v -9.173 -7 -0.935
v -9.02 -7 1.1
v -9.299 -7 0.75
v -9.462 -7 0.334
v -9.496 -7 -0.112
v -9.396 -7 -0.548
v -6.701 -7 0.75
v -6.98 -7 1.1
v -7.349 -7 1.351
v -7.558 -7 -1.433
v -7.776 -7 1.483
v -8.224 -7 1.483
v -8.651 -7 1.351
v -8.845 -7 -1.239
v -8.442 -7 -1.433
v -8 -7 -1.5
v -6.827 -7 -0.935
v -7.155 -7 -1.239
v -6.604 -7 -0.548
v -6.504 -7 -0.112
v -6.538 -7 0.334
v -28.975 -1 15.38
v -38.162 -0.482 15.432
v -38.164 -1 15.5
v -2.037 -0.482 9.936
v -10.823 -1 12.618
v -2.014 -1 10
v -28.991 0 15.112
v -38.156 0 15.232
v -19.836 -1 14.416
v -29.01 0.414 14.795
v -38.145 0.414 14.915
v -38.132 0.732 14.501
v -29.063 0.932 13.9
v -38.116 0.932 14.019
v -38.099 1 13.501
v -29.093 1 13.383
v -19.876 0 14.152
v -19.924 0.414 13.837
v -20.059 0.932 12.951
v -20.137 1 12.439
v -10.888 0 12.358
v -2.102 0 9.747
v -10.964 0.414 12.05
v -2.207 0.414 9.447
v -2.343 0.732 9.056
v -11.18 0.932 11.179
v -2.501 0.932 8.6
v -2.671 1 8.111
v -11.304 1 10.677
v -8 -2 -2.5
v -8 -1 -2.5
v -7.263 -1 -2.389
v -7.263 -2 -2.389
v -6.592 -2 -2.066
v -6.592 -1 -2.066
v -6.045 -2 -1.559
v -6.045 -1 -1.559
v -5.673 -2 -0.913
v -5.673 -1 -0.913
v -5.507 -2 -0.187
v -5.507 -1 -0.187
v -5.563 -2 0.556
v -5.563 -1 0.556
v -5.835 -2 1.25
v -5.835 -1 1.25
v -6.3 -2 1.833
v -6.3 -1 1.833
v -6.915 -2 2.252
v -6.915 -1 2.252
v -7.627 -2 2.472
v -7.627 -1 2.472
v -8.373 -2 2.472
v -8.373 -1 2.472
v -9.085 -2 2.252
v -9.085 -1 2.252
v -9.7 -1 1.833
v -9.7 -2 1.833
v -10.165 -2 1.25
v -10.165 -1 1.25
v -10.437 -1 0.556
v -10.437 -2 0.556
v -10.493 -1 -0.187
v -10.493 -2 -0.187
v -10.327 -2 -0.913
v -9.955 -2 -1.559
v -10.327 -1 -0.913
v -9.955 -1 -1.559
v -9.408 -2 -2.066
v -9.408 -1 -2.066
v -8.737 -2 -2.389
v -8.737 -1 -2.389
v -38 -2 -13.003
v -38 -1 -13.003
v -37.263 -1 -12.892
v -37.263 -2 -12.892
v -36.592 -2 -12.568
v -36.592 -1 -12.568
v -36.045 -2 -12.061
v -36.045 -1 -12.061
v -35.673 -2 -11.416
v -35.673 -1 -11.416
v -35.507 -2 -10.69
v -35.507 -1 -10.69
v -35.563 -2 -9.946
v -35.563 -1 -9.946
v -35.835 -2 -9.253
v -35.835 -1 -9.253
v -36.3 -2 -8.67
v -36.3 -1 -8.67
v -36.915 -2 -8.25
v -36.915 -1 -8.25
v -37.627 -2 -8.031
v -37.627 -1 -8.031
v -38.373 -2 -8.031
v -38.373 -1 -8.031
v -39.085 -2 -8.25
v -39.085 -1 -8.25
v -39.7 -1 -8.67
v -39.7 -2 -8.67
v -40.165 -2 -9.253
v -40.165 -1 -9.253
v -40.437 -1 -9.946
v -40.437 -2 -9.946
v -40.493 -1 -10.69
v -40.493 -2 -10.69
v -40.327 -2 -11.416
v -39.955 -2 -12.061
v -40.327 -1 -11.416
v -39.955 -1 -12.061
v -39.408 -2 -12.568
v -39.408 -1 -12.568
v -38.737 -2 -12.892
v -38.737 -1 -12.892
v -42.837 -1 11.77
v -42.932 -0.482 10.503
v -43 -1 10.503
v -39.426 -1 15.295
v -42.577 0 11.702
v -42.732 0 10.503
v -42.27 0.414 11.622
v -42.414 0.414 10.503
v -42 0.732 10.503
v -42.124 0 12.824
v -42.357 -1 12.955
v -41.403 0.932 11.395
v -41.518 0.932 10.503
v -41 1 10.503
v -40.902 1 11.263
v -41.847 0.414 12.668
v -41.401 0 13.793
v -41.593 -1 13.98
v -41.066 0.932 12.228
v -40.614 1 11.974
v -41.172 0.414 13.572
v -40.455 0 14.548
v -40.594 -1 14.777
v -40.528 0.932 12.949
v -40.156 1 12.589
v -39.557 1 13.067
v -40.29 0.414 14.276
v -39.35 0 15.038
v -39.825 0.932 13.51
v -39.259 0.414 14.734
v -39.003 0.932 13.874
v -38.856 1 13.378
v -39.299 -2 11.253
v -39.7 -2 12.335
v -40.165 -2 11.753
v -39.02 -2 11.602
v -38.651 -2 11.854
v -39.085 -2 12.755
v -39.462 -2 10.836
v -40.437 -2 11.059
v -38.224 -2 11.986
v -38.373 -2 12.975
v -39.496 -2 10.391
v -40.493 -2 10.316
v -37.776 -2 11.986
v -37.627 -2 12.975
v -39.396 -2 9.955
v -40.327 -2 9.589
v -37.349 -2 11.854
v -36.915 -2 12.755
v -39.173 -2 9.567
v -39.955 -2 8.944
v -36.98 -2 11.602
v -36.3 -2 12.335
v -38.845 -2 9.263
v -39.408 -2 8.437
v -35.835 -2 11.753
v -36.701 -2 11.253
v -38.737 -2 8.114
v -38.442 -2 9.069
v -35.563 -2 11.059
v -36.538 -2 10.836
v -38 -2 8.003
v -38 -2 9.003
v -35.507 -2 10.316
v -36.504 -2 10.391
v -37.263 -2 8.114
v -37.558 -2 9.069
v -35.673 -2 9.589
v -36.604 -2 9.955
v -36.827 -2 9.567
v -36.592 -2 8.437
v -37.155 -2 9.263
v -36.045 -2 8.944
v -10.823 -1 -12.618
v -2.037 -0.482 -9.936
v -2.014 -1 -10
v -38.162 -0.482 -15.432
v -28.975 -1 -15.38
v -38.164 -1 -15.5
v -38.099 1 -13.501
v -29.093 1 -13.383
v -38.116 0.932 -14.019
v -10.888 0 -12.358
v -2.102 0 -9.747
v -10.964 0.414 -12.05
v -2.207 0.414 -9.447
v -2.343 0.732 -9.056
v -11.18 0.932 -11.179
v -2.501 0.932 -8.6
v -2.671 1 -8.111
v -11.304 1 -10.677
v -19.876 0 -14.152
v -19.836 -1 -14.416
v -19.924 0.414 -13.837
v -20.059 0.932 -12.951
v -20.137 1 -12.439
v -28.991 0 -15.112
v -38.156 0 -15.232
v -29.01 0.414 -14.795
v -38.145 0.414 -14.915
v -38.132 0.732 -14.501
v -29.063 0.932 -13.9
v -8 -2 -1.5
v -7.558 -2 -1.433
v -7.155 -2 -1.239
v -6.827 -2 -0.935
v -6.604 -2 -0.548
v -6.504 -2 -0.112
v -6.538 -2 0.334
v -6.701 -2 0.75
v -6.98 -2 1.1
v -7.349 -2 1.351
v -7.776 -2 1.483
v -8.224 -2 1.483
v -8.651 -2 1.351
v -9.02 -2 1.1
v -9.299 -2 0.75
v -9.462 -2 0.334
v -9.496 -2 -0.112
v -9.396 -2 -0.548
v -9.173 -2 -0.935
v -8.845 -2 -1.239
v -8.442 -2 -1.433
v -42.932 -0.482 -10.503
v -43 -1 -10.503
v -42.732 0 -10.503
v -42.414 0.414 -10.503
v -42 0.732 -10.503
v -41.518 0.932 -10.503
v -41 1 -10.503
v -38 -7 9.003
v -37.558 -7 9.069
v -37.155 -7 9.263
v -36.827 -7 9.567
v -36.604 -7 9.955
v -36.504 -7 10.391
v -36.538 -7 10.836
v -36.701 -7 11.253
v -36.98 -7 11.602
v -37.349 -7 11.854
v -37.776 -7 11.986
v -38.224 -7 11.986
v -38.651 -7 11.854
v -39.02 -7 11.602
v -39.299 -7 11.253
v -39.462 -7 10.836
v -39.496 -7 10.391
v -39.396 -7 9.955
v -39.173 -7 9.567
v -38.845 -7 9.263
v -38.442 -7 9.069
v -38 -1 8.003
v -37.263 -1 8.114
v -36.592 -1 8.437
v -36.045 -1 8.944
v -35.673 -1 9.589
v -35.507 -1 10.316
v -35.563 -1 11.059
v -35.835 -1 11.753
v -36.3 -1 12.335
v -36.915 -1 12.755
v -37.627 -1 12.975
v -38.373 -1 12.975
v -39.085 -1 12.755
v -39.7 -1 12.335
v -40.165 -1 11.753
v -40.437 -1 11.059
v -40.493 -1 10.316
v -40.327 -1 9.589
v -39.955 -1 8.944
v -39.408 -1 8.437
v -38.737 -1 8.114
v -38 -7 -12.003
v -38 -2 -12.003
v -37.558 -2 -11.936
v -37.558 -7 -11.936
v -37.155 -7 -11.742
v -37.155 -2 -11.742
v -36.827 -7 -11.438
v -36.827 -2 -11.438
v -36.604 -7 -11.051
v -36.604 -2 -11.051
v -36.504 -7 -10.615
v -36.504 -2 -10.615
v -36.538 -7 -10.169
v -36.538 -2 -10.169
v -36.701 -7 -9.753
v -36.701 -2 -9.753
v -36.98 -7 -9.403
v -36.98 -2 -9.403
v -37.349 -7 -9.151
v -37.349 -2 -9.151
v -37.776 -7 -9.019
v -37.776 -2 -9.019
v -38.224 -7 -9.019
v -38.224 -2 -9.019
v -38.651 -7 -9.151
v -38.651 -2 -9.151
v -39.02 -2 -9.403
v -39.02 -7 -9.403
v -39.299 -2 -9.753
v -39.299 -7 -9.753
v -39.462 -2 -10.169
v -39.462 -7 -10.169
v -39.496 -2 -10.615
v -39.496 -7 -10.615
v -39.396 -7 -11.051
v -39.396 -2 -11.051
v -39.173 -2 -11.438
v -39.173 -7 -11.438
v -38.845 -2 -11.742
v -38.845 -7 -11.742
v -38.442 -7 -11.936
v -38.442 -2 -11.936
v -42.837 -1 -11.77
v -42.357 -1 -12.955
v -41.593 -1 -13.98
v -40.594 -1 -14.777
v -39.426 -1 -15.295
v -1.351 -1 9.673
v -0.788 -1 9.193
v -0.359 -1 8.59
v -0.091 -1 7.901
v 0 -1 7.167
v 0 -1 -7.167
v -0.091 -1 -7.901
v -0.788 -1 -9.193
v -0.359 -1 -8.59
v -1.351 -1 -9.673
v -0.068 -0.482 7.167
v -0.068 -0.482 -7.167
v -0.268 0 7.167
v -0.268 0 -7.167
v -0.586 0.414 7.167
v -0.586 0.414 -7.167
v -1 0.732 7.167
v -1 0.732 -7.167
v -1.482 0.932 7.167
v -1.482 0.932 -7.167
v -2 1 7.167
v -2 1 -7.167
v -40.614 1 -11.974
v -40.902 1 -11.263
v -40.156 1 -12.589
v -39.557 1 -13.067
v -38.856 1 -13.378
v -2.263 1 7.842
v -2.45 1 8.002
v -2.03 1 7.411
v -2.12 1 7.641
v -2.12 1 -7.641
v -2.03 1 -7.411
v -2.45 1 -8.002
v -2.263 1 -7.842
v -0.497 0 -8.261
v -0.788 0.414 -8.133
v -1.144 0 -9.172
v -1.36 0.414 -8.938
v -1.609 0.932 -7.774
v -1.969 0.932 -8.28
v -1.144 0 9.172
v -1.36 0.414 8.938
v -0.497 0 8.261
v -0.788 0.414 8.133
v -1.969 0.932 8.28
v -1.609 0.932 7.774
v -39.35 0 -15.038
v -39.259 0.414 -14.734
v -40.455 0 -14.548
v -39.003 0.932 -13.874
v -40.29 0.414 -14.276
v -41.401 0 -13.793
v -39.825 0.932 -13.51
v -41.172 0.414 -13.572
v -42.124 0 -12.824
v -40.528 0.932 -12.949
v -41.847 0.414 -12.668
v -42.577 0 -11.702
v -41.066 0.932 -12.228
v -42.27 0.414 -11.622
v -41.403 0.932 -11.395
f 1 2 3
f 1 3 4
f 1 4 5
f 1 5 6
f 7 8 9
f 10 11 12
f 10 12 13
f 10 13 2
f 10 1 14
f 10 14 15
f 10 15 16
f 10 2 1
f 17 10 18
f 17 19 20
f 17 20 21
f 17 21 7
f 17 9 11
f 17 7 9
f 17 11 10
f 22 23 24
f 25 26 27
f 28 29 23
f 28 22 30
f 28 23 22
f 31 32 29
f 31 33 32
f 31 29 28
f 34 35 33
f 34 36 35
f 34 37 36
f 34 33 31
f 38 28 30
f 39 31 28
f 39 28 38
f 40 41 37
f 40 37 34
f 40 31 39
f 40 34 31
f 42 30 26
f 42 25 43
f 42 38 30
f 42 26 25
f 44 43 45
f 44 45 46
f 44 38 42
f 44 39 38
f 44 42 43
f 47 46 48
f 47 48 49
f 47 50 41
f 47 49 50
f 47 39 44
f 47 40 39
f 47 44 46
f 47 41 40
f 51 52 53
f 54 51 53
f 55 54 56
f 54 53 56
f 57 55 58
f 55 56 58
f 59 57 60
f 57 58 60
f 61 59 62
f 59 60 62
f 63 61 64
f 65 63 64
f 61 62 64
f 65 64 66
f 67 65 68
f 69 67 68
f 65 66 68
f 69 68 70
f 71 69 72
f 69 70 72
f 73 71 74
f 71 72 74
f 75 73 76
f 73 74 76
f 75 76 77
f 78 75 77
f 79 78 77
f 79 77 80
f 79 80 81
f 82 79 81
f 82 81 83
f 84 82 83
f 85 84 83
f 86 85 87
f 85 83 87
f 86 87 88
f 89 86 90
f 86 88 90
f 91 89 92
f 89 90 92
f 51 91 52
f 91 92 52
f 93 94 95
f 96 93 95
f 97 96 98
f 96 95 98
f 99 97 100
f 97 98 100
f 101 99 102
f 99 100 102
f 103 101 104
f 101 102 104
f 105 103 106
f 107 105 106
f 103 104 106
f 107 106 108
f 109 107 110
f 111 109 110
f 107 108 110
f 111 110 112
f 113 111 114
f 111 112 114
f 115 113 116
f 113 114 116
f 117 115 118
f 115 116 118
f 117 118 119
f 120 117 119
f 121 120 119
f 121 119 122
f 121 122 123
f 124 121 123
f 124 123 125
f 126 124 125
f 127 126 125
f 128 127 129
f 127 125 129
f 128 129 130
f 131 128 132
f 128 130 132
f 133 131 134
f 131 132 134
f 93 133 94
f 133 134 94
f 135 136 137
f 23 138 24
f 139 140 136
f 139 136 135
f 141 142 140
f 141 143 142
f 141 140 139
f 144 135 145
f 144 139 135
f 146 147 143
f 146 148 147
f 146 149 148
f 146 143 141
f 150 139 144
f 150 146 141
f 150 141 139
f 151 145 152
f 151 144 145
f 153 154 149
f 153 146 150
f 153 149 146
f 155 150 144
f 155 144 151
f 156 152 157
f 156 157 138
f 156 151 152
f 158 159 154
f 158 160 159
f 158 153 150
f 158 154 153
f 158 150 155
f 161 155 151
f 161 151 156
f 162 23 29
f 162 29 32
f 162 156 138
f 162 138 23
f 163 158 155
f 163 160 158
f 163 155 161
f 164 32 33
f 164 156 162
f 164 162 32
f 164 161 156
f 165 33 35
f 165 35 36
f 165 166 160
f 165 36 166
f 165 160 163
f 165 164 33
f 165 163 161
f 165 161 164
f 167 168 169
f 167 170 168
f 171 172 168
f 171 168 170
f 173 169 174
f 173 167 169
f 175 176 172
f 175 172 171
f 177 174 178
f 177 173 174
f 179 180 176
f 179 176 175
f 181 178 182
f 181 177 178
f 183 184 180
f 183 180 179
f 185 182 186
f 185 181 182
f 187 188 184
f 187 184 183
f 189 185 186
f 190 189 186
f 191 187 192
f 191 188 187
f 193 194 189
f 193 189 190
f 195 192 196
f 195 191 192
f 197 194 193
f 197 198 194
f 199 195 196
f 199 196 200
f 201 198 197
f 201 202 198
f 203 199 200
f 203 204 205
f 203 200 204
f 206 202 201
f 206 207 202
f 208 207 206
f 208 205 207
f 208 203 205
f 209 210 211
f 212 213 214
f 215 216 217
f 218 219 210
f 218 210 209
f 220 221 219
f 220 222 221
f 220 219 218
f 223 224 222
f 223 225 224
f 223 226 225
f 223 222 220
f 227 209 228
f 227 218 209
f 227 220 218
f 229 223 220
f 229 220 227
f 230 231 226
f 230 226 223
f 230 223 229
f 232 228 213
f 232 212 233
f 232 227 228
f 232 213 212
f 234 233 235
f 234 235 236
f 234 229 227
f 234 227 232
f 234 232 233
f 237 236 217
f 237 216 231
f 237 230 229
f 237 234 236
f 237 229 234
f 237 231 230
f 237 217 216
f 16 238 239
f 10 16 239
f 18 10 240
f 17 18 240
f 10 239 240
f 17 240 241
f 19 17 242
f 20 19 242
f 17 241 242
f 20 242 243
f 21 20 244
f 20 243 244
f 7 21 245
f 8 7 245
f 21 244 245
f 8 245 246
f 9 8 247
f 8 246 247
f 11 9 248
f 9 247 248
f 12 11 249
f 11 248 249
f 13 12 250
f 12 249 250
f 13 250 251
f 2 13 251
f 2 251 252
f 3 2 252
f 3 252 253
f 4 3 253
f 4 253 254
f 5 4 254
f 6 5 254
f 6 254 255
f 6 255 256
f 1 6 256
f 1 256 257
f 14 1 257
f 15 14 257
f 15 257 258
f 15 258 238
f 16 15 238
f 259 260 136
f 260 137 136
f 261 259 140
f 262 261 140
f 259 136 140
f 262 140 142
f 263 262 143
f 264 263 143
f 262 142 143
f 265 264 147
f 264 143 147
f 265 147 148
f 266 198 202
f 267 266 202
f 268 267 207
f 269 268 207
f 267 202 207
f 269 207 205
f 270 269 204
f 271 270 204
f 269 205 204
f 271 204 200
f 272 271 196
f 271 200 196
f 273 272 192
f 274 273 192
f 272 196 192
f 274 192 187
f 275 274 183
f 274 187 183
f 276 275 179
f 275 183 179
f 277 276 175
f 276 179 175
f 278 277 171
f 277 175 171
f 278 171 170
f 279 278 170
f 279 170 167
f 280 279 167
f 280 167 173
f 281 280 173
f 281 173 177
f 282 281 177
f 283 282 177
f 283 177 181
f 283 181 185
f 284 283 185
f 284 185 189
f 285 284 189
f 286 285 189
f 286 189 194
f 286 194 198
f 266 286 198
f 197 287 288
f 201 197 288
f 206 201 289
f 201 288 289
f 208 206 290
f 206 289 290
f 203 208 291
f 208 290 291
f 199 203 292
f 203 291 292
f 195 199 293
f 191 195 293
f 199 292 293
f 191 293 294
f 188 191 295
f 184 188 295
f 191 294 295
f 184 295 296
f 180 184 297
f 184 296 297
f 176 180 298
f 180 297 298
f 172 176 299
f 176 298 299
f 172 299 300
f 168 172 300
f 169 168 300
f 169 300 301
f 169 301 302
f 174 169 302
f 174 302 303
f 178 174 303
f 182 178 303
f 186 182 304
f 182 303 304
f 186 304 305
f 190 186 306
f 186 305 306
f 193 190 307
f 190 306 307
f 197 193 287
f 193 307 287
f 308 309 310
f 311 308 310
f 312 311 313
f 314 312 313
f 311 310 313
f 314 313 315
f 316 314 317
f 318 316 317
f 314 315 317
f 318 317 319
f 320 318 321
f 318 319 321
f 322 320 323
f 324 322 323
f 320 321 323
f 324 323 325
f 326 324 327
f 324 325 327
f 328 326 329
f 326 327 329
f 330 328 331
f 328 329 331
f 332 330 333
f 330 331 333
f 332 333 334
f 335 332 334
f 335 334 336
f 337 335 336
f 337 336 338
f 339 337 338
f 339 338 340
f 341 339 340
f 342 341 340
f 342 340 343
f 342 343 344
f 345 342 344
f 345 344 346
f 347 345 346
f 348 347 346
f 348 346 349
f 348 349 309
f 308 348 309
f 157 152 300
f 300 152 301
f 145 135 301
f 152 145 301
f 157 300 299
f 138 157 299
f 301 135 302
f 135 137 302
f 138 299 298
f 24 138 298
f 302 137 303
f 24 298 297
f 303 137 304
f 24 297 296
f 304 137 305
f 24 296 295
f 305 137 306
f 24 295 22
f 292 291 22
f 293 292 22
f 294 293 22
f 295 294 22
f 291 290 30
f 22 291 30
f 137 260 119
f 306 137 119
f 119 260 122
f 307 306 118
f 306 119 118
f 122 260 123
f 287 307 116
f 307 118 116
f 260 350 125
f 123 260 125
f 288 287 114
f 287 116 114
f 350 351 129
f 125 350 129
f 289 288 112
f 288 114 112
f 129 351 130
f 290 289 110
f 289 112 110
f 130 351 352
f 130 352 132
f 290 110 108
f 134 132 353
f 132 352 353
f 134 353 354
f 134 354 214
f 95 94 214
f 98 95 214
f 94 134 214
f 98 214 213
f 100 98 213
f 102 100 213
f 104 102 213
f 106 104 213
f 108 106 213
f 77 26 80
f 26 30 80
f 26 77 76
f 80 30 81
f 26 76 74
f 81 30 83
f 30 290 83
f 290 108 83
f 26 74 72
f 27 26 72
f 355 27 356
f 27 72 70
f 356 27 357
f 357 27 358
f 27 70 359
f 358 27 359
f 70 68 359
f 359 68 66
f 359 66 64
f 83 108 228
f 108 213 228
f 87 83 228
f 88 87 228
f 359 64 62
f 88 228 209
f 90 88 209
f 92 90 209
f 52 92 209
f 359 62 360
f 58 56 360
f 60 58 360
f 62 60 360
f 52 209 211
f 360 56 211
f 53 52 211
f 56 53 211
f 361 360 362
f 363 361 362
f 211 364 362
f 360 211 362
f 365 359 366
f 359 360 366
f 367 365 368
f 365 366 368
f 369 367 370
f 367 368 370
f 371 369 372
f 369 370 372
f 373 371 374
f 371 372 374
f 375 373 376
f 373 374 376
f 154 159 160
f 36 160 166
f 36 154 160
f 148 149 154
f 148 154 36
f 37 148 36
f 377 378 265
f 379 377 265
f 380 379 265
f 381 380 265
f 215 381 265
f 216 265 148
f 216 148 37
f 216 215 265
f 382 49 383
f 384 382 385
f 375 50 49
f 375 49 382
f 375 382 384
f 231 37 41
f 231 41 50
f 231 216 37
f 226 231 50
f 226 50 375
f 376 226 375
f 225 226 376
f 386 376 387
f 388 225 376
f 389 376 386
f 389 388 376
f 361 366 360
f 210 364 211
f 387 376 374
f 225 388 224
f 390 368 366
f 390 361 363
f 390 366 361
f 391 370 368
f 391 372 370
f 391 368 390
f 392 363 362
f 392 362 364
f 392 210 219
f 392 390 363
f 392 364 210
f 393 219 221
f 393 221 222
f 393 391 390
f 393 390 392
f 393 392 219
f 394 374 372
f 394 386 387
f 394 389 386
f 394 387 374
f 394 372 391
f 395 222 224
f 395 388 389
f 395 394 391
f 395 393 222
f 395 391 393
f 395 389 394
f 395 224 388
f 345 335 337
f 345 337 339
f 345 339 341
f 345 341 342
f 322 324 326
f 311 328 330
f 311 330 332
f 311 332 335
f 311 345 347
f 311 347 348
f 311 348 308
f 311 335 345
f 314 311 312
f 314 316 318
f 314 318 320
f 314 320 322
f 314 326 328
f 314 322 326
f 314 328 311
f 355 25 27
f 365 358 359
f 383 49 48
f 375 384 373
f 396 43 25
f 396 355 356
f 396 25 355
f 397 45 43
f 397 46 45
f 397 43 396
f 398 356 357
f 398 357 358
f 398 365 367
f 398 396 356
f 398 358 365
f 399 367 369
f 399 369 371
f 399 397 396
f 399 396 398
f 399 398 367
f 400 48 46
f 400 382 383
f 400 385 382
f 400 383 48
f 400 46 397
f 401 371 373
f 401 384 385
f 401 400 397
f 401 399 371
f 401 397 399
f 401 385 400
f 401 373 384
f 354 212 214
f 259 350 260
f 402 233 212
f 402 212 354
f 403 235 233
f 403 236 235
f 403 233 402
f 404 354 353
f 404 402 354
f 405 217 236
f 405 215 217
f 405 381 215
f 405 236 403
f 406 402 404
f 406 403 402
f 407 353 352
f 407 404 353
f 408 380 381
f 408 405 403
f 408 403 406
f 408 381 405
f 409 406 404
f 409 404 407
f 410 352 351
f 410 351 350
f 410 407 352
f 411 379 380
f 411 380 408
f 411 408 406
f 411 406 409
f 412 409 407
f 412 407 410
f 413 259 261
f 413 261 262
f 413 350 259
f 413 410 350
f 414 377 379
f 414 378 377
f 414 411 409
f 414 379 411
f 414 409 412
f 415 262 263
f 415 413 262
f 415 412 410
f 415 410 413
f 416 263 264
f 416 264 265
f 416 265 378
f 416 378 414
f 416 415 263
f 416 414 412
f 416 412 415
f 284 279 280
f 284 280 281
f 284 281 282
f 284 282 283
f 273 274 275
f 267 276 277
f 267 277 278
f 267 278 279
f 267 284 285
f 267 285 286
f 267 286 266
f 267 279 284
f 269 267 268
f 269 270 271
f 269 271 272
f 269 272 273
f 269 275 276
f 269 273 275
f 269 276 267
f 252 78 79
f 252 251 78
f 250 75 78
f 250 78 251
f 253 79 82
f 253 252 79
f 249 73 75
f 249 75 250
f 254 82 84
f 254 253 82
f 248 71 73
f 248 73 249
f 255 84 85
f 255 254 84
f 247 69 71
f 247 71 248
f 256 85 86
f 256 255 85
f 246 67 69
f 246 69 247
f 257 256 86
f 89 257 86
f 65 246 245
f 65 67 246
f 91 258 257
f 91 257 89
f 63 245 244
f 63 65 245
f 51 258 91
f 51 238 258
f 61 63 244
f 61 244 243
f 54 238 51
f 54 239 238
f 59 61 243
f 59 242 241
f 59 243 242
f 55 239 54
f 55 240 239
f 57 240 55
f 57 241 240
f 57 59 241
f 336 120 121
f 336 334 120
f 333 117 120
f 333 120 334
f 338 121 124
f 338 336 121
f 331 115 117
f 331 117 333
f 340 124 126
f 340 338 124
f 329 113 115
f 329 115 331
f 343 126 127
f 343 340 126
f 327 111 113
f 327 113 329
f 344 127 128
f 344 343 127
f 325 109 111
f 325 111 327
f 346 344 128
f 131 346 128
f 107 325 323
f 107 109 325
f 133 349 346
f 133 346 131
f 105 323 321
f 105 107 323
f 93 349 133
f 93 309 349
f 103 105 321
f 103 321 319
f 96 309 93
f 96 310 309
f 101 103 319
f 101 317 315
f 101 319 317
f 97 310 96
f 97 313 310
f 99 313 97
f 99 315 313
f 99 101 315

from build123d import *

# Parameters (mm, degrees)
BOSS_EXTRUDE1_DEPTH = 1
SKETCH2_R           = 2.5
SKETCH2_R_2         = 1.5
BOSS_EXTRUDE2_DEPTH = 1
SKETCH2_2_R         = 1.5
BOSS_EXTRUDE3_DEPTH = 6
FILLET1_R           = 2


with BuildPart() as part:
    # Sketch1 → Boss-Extrude1 (new, symmetric)
    with BuildSketch(Plane(origin=(0, 0, 0), x_dir=(1, 0, 0), z_dir=(0, 1, 0))):
        with BuildLine():
            Line((0, -7.166621556), (0, 7.166621556))
            ThreePointArc((0, 7.166621556), (-0.554836306, 8.90477417), (-2.01411634, 10))
            ThreePointArc((-2.01411634, 10), (-19.83571516, 14.416393561), (-38.164373421, 15.5))
            ThreePointArc((-38.164373421, 15.5), (-41.593178753, 13.979636076), (-43, 10.502702593))
            Line((-43, 10.502702593), (-43, -10.502702593))
            ThreePointArc((-43, -10.502702593), (-41.593178753, -13.979636076), (-38.164373421, -15.5))
            ThreePointArc((-38.164373421, -15.5), (-19.83571516, -14.416393561), (-2.01411634, -10))
            ThreePointArc((-2.01411634, -10), (-0.554836306, -8.90477417), (0, -7.166621556))
        make_face()
    extrude(amount=BOSS_EXTRUDE1_DEPTH, both=True)

    # Sketch2 → Boss-Extrude2 (add)
    with BuildSketch(Plane.XZ.offset(1)):
        with Locations(Location((-8, 0, 0), (0, 0, 270))):
            Circle(SKETCH2_R)
        with Locations(Location((-8, 0, 0), (0, 0, 270))):
            Circle(SKETCH2_R_2, mode=Mode.SUBTRACT)
    boss_extrude2 = extrude(amount=BOSS_EXTRUDE2_DEPTH)

    # Sketch2<2> → Boss-Extrude3 (add)
    with BuildSketch(Plane.XZ.offset(1)):
        with Locations(Location((-8, 0, 0), (0, 0, 270))):
            Circle(SKETCH2_2_R)
    boss_extrude3 = extrude(amount=BOSS_EXTRUDE3_DEPTH)

    # Sketch-Pattern1: Boss-Extrude2, Boss-Extrude3 at 2 more places
    with Locations((-30, 0, 10.502703), (-30, 0, -10.502703)):
        add(boss_extrude2)
        add(boss_extrude3)

    # Fillet1
    fillet1_edges = [part.edges().sort_by_distance(p)[0] for p in [
        (-19.83571516, 1, 14.416393561),
        (-41.593178753, 1, 13.979636076),
        (-43, 1, 0),
        (-41.593178753, 1, -13.979636076),
        (-0.554836306, 1, -8.90477417),
        (0, 1, 0),
        (-0.554836306, 1, 8.90477417),
        (-19.83571516, 1, -14.416393561),
    ]]
    fillet(fillet1_edges, radius=FILLET1_R - 0.0001)  # a hair under: the kernel refuses the full size


solid = part.part
